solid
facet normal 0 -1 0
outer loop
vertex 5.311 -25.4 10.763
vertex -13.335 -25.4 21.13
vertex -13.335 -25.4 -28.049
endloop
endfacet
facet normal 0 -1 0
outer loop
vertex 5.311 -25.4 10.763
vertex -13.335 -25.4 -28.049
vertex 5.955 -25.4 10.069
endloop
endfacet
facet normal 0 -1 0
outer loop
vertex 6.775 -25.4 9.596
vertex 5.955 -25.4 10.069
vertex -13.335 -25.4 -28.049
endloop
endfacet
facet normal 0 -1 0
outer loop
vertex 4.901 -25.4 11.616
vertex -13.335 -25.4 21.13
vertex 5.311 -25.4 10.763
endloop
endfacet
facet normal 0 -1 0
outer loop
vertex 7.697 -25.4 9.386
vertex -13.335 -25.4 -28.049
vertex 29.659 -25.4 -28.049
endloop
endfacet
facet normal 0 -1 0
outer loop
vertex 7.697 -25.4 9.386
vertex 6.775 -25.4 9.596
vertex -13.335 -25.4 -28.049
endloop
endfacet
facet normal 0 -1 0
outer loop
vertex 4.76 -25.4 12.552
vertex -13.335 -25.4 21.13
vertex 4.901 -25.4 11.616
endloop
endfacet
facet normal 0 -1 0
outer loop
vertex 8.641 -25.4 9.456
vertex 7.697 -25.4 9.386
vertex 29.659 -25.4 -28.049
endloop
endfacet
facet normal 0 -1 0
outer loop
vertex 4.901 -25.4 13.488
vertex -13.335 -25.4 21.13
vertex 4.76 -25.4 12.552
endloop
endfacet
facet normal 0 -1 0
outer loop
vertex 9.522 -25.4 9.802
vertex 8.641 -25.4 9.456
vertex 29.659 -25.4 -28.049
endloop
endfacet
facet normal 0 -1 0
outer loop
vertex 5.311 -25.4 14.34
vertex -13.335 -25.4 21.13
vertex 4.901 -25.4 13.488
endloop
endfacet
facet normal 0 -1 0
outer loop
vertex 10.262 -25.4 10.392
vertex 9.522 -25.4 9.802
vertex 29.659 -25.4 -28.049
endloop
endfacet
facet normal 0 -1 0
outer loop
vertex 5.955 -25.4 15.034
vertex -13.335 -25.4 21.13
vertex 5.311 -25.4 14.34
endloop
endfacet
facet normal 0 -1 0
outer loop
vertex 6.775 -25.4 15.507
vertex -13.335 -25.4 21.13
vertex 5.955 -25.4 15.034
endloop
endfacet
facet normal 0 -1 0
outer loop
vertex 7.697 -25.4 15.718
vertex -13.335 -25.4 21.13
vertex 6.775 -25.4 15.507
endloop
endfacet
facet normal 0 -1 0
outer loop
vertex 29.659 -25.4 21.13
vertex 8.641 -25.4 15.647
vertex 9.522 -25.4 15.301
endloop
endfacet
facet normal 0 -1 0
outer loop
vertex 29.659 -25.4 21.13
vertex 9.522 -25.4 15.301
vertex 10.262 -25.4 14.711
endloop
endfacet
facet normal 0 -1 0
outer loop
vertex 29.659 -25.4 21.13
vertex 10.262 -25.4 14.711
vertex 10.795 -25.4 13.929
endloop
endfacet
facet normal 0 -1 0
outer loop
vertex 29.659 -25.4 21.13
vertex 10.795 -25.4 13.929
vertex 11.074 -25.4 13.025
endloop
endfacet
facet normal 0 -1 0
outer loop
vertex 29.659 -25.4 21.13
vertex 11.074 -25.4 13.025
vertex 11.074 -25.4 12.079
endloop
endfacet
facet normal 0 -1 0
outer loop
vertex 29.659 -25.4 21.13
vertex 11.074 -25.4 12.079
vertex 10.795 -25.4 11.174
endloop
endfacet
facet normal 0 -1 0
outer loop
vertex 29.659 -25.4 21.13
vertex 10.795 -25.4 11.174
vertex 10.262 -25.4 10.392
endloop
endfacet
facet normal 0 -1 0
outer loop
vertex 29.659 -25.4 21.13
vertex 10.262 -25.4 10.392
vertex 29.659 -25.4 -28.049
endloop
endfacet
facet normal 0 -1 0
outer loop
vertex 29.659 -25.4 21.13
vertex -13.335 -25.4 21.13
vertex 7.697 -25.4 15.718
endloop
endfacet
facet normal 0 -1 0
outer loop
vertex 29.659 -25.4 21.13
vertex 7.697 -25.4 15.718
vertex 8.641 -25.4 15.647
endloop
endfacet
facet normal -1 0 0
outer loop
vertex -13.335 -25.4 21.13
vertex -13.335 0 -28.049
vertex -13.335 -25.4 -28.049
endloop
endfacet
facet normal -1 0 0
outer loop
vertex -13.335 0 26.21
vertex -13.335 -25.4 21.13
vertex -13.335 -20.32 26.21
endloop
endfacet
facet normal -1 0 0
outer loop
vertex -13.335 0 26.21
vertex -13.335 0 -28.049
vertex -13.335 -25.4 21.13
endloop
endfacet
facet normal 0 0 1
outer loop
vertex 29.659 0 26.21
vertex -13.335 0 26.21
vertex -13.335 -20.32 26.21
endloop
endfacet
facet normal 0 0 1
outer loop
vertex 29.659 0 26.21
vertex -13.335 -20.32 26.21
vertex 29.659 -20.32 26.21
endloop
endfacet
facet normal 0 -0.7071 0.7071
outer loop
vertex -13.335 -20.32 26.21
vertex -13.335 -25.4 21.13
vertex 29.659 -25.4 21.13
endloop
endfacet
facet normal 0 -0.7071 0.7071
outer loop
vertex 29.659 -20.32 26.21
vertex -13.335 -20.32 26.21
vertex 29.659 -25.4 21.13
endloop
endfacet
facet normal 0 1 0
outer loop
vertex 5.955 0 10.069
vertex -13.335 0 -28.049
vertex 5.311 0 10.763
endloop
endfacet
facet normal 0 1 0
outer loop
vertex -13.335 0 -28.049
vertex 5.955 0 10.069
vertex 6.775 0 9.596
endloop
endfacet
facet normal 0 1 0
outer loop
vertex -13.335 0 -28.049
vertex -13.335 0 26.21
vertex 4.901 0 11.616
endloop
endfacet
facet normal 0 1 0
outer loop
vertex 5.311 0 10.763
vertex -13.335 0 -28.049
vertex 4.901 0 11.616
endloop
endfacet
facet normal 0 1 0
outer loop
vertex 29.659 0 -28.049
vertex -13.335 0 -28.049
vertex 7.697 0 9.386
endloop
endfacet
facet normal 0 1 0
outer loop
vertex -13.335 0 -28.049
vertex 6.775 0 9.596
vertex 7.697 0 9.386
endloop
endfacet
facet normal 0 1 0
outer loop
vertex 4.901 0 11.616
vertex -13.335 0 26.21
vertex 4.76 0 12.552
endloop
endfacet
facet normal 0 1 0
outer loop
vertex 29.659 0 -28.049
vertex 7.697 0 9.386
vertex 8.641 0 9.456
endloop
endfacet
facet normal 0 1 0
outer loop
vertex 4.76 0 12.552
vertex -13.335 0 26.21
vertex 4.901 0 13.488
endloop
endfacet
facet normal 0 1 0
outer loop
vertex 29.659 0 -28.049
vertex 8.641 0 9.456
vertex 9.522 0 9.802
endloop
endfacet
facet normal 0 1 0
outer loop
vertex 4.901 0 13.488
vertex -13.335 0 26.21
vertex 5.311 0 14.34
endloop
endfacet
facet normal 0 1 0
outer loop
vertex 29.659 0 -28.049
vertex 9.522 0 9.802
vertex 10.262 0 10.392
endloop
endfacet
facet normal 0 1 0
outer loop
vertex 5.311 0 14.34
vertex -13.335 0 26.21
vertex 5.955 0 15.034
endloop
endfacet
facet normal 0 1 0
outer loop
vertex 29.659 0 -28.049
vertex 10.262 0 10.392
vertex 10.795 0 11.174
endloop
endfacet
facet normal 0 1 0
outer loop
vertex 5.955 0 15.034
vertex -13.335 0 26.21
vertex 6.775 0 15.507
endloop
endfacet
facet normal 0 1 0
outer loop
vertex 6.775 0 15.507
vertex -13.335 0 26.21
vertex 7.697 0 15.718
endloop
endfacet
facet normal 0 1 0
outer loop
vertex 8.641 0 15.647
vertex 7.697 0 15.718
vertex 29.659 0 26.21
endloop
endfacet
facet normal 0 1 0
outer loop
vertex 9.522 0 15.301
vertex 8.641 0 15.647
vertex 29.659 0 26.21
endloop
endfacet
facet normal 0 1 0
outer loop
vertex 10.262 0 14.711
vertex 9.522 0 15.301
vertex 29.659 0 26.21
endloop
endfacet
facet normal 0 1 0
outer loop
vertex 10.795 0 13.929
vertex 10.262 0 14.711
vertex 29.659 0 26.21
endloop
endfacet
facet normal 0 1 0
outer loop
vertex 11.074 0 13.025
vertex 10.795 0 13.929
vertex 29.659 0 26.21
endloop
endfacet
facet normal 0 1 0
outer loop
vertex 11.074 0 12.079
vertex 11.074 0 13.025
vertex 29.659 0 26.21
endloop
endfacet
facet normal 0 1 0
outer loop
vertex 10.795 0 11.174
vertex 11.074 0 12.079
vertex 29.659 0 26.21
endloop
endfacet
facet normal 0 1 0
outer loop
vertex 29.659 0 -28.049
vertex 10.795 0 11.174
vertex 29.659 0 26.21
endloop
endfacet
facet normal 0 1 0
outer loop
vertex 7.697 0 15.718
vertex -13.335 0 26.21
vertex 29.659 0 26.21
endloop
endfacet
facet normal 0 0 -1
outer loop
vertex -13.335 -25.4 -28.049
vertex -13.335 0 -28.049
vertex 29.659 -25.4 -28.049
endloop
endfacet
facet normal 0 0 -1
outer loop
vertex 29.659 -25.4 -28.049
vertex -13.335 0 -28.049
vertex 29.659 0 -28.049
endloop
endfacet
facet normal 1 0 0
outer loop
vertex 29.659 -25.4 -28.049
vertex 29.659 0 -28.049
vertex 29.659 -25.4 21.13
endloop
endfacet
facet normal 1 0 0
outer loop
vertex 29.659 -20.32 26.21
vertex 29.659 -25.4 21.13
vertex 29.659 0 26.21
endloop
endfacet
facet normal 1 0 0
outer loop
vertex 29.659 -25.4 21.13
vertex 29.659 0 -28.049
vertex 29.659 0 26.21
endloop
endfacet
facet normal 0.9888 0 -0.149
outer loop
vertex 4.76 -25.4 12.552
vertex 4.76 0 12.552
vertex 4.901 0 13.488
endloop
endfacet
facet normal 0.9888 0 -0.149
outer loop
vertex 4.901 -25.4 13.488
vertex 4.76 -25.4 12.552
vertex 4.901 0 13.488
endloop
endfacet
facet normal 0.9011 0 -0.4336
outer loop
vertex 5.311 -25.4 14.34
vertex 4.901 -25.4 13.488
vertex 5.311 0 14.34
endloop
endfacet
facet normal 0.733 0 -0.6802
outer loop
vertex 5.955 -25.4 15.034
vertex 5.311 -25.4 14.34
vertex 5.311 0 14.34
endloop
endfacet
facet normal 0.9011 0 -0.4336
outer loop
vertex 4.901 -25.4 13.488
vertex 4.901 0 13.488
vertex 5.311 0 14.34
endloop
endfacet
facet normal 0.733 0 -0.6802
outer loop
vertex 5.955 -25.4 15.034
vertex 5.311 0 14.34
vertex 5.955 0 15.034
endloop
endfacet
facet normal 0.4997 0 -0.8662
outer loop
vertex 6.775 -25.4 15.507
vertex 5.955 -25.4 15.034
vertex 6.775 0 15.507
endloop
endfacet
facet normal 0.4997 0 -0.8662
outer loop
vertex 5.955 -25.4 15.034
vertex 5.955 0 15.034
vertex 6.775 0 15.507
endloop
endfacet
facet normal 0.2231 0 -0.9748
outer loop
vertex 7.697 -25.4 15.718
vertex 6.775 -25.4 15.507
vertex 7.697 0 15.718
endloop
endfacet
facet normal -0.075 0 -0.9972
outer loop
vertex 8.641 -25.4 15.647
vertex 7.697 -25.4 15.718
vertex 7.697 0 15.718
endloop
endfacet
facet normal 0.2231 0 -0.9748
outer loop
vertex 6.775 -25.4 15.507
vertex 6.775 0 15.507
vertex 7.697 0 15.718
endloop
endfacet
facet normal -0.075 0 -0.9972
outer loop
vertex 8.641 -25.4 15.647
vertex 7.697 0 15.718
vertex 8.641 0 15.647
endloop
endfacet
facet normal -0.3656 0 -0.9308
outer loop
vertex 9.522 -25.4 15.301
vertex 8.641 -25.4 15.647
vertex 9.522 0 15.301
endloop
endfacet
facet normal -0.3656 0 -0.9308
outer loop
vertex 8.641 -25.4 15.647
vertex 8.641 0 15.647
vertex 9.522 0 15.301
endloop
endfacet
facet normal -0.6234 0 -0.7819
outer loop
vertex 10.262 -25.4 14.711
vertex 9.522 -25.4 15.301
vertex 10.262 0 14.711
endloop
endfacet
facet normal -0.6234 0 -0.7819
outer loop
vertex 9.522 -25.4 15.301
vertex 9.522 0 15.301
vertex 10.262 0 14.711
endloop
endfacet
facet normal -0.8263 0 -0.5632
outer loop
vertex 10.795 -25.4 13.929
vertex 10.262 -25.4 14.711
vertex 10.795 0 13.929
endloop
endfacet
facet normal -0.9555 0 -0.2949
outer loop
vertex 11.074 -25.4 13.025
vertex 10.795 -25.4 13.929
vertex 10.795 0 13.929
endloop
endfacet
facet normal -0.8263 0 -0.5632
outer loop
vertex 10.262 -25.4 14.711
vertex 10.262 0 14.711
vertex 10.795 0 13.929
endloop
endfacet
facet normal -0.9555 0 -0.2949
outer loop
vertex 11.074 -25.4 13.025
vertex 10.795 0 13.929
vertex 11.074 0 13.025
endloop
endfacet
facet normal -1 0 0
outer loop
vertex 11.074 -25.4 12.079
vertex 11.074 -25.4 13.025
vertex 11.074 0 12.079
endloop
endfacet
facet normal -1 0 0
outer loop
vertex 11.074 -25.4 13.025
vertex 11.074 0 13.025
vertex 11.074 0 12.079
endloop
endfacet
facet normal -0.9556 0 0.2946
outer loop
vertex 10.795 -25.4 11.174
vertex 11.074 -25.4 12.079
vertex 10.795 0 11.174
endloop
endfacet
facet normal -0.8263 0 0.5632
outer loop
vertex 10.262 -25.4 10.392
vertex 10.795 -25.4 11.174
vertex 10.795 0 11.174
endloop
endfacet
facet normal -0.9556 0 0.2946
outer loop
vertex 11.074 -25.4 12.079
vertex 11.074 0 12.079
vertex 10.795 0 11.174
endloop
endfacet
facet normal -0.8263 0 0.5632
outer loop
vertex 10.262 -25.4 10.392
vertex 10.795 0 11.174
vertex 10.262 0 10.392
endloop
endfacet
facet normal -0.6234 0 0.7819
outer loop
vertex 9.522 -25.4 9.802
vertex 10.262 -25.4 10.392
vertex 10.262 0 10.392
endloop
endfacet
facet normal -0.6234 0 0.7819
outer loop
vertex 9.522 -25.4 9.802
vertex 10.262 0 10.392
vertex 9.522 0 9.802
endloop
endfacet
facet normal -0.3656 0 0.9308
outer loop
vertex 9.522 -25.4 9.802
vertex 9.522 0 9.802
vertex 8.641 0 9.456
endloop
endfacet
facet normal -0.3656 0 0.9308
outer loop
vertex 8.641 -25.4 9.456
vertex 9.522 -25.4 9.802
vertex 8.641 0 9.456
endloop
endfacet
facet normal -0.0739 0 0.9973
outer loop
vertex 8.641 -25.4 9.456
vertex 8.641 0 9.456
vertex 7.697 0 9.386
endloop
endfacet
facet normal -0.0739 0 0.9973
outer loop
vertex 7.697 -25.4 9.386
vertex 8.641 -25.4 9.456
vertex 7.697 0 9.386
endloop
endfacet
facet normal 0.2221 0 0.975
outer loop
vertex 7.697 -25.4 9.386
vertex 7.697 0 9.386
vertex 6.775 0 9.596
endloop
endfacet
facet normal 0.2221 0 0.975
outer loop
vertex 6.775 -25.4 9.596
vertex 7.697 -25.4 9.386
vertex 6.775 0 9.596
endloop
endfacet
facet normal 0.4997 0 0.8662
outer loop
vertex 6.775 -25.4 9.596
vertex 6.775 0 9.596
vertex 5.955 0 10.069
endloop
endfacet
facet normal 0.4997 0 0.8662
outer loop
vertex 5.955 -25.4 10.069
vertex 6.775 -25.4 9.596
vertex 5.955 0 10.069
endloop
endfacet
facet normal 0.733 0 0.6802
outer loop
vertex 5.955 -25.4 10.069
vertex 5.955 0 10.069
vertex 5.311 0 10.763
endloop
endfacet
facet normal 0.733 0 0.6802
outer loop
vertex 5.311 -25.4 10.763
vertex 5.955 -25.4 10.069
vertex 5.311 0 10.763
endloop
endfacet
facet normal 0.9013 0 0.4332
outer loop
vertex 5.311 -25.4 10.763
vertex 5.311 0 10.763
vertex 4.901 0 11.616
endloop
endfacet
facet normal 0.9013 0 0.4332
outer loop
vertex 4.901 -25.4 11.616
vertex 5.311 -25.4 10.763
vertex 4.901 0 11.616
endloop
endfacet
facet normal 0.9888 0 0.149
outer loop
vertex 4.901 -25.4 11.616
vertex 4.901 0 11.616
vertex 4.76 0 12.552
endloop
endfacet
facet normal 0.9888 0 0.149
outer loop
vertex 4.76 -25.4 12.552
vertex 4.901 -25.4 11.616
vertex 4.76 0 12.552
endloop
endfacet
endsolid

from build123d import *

# Parameters (mm, degrees)
F0_W     = 42.9938789457
F0_H     = 54.2596541345
F1_DEPTH = 25.4
F3_D     = 6.35
F6_SIZE  = 5.08


# Not quite as in the source:
# - the program builds the solid bodies; features that only make, move or delete a surface that nothing else refers to are left out


with BuildPart() as f1:
    # F0 (on Front) → F1 (new body)
    with BuildSketch(Plane.XZ):
        with Locations((8.1619387493, -0.9196549654)):
            Rectangle(F0_W, F0_H)
    extrude(amount=F1_DEPTH)

    # F3 (through all)
    with Locations(Plane.XZ.offset(25.4)):
        with Locations((7.9346429557, 12.5517835841)):
            Hole(F3_D / 2)

    # F6
    f6_edges = [f1.edges().sort_by_distance(p)[0] for p in [
        (8.161939, -25.4, 26.210172),
    ]]
    chamfer(f6_edges, length=F6_SIZE)


solid = f1.part
